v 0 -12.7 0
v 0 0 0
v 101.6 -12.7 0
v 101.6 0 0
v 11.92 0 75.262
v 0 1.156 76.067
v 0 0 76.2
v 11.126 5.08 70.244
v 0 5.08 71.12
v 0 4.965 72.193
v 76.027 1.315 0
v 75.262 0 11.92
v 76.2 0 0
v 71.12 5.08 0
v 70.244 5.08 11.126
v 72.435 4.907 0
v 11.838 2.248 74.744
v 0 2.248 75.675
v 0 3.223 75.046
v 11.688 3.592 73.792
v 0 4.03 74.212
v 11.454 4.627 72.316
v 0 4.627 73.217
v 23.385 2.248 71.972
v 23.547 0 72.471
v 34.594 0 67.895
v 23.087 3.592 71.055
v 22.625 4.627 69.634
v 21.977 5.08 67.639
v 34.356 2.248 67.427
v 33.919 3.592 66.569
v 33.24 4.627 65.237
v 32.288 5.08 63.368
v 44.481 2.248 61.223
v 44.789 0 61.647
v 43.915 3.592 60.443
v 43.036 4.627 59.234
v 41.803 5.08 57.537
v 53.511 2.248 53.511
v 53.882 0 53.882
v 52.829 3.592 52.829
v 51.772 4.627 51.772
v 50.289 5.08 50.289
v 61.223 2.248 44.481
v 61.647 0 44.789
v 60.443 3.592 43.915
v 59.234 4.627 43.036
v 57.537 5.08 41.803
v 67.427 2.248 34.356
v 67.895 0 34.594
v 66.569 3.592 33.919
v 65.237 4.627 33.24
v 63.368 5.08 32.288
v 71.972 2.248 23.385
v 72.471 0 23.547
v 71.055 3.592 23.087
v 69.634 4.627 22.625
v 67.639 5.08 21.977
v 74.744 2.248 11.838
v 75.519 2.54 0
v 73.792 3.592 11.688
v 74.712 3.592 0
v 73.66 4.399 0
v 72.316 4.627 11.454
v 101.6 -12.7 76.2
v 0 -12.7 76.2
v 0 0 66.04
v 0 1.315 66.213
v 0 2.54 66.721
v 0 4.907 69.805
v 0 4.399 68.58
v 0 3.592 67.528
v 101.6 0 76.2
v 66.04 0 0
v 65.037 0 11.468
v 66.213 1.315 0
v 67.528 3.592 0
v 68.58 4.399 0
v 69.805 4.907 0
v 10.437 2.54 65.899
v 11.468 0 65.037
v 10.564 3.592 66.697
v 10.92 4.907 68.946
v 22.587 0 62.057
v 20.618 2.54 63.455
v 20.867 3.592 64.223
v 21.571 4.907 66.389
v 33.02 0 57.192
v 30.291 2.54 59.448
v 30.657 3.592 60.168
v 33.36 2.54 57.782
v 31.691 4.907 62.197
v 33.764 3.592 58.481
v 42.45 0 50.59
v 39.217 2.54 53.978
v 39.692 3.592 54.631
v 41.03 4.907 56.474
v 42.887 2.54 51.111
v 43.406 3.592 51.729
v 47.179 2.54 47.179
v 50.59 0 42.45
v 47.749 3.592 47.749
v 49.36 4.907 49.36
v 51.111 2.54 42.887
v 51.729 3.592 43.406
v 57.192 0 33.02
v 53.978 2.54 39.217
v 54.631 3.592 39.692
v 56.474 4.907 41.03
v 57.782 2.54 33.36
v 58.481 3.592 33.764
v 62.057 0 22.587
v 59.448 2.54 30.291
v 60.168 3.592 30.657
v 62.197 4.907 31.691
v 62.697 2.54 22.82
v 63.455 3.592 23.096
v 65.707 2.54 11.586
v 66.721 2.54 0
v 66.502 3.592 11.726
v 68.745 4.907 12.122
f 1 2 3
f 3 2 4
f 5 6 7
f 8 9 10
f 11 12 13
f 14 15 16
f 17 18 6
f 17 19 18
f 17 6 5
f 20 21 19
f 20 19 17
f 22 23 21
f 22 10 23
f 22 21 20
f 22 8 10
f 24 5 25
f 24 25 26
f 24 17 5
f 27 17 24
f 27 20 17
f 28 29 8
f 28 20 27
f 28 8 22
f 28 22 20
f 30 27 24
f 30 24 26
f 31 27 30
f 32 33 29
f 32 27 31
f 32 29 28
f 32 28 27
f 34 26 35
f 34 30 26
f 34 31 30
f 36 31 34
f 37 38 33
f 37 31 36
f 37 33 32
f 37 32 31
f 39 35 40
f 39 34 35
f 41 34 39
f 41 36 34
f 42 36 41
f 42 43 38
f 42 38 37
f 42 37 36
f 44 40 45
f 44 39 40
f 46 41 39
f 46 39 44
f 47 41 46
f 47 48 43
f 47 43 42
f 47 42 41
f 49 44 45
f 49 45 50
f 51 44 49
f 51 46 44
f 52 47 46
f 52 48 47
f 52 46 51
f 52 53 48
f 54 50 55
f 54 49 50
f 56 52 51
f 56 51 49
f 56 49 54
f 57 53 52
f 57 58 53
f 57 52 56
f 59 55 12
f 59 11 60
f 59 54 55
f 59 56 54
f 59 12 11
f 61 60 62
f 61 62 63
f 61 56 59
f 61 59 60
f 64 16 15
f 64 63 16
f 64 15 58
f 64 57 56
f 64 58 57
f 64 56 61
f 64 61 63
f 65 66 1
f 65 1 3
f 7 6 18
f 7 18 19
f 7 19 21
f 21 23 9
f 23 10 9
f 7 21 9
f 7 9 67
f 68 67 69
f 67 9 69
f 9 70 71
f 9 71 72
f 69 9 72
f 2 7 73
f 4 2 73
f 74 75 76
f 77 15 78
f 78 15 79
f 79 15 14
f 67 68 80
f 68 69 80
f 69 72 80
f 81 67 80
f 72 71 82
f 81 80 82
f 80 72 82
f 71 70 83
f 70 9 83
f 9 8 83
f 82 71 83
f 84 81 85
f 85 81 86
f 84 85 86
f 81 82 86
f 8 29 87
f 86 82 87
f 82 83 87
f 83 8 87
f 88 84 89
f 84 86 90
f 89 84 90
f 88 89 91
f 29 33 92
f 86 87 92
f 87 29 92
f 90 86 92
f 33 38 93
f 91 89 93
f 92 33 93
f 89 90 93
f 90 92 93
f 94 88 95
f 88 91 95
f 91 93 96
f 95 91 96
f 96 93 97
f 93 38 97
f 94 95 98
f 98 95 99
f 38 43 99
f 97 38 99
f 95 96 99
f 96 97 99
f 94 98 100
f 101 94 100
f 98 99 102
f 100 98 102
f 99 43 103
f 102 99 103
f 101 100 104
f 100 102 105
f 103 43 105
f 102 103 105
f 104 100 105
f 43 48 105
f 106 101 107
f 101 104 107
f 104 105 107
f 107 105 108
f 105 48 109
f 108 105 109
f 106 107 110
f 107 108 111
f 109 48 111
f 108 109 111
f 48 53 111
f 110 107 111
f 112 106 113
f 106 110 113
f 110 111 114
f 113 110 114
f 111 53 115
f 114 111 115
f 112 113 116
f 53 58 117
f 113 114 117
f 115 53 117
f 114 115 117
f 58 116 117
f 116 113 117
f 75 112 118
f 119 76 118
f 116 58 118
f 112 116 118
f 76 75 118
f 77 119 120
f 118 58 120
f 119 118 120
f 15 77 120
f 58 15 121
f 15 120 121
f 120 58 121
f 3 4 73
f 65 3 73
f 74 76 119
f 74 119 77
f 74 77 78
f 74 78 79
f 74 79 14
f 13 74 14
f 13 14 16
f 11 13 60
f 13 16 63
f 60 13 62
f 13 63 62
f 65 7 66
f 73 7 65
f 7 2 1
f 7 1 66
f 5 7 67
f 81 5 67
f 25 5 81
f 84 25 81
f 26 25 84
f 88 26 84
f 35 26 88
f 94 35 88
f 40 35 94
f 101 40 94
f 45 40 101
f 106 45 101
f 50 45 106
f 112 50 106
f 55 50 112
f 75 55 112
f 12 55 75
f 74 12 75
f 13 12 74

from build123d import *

# Parameters (mm, degrees)
F0_W     = 101.6
F0_H     = 76.2
F1_DEPTH = 12.7
F5_R     = 5.07999


# Not quite as in the source:
# - a fillet or chamfer is up to 0.001 mm smaller than in the source, because OpenCascade refuses the exact size


with BuildPart() as f1:
    # F0 (on Front) → F1 (new body)
    with BuildSketch(Plane.XZ):
        with Locations((50.8, 38.1)):
            Rectangle(F0_W, F0_H)
    extrude(amount=F1_DEPTH)


with BuildPart() as f4:
    # F4: sweep along a path in F3
    with BuildLine(Plane.XY) as f4_path:
        Line((13.2644446979, 0), (13.2644446979, 5.08))
    # F2 (on Front) → F4 (sweep)
    with BuildSketch(Plane.XZ):
        with BuildLine():
            ThreePointArc((0, 66.04), (46.6973318296, 46.6973318296), (66.04, 0))
            Line((66.04, 0), (76.2, 0))
            ThreePointArc((76.2, 0), (53.8815367264, 53.8815367264), (0, 76.2))
            Line((0, 76.2), (0, 66.04))
        make_face()
    sweep(path=f4_path.line)

    # F5 (radius 5.08 in the source; OpenCascade refuses exactly that, so slightly less here)
    f5_edges = [f4.edges().sort_by_distance(p)[0] for p in [
        (46.697332, 5.08, 46.697332),
        (53.881537, 5.08, 53.881537),
    ]]
    fillet(f5_edges, radius=F5_R)


solid = Compound([f1.part, f4.part])
